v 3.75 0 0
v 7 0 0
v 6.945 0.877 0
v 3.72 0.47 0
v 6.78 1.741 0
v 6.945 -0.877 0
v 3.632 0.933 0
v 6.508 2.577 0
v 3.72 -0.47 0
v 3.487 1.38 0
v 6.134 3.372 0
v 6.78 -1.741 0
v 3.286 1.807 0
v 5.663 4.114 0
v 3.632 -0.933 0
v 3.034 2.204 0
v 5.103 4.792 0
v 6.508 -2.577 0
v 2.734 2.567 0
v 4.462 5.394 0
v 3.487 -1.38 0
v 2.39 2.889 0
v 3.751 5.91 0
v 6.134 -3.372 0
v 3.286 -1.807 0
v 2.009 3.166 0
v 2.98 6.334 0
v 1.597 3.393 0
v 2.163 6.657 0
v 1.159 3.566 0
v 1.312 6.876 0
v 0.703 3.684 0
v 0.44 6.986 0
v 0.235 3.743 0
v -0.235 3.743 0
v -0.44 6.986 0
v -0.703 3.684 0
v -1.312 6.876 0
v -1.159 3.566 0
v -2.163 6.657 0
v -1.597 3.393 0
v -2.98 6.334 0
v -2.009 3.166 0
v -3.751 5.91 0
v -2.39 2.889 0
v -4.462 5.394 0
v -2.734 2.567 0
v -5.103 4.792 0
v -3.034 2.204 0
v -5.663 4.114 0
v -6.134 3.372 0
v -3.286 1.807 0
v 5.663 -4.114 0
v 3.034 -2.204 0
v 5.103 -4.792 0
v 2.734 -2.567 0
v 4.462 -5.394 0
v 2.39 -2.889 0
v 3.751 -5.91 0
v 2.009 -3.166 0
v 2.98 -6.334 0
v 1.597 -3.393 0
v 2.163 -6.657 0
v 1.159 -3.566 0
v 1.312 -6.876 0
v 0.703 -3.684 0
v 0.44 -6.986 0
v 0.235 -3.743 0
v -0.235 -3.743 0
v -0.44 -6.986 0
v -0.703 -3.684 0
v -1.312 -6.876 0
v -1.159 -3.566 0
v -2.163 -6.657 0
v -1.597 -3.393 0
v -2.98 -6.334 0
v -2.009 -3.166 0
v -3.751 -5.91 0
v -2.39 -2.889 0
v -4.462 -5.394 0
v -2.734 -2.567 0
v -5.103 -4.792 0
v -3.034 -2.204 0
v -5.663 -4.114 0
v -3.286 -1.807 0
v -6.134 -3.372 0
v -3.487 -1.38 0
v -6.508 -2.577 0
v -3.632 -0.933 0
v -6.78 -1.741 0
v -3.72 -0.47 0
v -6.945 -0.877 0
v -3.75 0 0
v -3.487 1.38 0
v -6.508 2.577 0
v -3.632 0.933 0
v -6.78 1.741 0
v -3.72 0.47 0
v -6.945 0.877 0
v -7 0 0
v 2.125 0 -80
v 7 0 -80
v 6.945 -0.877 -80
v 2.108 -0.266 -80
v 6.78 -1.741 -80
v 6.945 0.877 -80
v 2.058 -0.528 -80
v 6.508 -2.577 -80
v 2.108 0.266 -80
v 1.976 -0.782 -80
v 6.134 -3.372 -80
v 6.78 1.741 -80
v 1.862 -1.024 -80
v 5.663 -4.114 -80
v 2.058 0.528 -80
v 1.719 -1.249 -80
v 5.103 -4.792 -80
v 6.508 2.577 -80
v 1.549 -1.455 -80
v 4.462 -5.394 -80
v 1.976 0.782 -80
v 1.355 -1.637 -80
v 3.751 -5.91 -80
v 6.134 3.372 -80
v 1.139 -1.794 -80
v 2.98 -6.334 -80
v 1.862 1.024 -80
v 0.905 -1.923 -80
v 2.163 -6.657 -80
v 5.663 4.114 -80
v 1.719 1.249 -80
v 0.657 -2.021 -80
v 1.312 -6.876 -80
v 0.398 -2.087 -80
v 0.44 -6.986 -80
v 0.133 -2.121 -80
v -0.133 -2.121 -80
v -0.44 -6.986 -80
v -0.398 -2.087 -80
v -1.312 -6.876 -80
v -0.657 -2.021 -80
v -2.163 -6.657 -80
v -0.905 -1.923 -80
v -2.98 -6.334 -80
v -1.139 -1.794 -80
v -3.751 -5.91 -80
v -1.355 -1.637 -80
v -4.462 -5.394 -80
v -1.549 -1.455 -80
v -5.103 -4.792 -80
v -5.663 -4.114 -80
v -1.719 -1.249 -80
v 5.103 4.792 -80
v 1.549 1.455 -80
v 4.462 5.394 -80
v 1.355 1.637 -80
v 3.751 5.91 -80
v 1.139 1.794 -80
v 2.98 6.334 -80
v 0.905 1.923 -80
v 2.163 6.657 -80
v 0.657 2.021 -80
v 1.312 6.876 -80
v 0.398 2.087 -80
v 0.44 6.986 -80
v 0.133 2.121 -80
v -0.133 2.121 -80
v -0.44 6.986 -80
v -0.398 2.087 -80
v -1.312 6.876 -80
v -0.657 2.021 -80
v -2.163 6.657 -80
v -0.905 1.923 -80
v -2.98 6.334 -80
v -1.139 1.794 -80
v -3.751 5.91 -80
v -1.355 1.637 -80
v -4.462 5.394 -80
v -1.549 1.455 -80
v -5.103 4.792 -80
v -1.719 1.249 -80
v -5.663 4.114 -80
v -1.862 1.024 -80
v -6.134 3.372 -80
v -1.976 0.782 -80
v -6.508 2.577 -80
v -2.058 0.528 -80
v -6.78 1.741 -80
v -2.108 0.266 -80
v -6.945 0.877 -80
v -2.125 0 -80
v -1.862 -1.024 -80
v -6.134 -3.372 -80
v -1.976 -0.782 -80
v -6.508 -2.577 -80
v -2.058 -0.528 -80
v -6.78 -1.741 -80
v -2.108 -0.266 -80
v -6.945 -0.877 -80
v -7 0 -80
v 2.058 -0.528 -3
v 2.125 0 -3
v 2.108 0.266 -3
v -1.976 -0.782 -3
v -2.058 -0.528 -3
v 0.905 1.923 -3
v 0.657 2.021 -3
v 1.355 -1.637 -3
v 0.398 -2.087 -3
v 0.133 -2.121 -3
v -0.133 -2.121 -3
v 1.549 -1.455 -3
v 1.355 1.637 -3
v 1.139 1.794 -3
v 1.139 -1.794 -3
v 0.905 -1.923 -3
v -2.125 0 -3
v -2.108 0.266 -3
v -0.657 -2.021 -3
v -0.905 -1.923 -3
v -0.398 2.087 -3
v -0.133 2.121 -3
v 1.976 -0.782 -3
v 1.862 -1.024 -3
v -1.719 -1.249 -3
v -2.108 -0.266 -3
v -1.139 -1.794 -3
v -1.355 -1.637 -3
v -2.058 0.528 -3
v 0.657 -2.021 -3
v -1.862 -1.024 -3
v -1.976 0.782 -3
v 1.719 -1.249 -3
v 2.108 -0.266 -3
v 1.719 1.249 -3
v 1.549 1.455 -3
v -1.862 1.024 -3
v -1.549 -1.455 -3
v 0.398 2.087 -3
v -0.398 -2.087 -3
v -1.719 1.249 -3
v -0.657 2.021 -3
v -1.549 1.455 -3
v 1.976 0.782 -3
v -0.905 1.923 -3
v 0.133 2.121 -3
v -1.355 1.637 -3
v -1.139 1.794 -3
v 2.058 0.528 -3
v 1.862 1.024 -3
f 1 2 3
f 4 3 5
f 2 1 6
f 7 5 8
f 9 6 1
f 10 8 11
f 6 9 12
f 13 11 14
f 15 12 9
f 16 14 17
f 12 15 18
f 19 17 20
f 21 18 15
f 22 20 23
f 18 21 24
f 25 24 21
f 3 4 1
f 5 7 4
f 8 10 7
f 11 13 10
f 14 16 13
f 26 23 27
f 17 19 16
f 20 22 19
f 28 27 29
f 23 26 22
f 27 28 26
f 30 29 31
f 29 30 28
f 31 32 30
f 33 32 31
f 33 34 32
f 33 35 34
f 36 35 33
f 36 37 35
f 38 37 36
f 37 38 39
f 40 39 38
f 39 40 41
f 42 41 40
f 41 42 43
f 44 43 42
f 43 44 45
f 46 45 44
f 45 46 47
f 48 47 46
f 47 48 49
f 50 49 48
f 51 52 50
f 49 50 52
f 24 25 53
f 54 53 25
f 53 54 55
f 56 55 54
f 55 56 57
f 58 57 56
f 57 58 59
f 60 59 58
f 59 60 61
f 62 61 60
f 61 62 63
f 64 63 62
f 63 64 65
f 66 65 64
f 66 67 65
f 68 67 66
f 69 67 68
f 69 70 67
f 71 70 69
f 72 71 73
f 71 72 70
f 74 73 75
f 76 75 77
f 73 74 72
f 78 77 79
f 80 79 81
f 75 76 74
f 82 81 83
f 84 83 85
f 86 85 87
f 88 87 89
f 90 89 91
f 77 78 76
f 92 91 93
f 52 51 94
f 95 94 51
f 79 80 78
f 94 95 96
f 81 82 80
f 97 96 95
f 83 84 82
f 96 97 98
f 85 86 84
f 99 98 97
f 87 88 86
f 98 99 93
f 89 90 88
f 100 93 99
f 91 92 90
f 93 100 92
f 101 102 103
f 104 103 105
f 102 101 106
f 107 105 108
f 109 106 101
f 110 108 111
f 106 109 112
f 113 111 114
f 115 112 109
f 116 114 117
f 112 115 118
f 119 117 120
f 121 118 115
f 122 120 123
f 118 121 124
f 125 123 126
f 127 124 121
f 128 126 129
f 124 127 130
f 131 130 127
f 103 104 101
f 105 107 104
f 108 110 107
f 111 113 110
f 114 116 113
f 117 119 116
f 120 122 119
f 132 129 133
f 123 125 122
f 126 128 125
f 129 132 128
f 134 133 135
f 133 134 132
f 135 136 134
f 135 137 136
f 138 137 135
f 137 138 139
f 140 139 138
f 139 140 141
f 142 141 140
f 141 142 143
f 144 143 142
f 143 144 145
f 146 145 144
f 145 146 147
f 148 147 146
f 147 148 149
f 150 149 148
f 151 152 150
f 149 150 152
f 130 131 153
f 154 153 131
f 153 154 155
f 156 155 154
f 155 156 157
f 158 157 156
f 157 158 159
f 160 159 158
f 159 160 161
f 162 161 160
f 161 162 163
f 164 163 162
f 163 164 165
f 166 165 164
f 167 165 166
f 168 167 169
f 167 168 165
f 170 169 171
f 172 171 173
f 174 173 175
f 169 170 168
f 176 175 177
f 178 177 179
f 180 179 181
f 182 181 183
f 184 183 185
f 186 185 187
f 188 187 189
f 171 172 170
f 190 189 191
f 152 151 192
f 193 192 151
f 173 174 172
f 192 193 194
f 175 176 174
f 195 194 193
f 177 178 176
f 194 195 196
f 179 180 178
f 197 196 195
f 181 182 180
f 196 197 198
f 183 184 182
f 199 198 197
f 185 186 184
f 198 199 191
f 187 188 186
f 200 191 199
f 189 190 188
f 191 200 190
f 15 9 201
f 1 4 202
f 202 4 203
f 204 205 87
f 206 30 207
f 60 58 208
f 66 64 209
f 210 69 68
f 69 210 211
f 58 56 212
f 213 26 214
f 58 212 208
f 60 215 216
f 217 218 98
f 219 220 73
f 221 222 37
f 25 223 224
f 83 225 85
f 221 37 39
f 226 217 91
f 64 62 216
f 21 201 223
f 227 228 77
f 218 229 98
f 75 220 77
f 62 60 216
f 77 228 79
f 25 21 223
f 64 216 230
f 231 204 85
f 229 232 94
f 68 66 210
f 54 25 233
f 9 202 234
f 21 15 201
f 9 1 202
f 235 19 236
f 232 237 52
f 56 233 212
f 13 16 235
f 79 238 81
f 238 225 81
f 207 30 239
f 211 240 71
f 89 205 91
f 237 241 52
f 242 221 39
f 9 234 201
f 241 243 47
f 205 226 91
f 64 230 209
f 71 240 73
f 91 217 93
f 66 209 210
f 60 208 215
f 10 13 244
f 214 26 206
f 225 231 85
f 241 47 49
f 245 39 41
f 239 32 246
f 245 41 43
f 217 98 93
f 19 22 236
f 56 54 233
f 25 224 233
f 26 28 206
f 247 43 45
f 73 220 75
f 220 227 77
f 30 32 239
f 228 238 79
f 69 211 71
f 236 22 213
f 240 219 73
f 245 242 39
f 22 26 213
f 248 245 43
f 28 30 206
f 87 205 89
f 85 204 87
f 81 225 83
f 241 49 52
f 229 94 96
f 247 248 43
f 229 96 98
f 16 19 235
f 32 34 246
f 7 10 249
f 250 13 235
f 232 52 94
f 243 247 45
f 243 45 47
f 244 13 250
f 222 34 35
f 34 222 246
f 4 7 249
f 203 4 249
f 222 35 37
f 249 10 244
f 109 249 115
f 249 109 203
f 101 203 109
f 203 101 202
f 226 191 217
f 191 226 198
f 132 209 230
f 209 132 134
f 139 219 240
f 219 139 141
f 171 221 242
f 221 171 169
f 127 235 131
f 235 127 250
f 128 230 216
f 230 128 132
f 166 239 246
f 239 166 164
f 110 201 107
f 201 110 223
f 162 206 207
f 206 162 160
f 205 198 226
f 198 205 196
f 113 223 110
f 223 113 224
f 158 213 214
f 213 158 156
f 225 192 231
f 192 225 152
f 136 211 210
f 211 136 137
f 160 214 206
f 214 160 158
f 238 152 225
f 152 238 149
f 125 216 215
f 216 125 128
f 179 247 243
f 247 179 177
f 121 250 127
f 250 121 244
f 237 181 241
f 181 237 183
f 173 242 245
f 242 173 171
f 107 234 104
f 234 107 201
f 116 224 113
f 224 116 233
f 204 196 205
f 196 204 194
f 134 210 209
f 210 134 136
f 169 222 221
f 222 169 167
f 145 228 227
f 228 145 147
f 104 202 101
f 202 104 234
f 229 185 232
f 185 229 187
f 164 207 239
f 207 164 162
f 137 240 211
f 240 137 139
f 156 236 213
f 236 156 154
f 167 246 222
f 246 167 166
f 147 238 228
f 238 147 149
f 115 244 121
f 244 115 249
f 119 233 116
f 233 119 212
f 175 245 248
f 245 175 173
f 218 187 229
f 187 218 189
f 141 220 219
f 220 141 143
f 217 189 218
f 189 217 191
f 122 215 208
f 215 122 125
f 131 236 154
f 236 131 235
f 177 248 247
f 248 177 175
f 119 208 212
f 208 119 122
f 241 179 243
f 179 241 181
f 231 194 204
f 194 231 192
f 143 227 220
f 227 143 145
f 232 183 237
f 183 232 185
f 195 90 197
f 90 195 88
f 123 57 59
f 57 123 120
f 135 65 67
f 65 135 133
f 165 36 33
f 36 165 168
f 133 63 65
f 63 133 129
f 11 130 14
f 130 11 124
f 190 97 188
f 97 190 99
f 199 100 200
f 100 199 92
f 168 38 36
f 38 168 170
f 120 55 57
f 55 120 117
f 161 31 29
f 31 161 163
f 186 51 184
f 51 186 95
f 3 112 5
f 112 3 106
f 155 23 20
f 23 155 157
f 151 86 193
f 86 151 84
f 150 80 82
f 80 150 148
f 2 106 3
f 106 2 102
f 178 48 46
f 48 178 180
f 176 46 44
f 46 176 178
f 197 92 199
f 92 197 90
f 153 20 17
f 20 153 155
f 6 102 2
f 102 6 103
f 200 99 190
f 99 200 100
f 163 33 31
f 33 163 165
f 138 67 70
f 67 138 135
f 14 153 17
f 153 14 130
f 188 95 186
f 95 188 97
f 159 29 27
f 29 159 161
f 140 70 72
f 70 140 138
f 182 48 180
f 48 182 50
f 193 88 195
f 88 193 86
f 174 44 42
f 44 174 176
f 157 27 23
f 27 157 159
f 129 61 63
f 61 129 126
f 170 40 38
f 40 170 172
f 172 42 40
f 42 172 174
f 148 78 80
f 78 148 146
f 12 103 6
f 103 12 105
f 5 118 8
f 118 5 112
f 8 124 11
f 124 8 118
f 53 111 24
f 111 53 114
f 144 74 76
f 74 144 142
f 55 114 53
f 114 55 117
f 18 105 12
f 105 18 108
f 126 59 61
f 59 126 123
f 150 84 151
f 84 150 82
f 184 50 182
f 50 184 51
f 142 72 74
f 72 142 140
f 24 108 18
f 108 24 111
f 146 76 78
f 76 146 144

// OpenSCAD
$fn = 50;


difference() {
	union() {
		translate(v = [0, 0, -80.0000000000]) {
			cylinder(h = 80, r = 7.0000000000);
		}
		cylinder(h = 0, r = 10.0000000000);
	}
	union() {
		translate(v = [0, 0, 0]) {
			rotate(a = [0, 0, 0]) {
				difference() {
					union() {
						#translate(v = [0, 0, -80.0000000000]) {
							cylinder(h = 80, r = 2.0000000000);
						}
						#translate(v = [0, 0, -3]) {
							cylinder(h = 3, r1 = 2.1250000000, r2 = 3.7500000000);
						}
						#translate(v = [0, 0, -80.0000000000]) {
							cylinder(h = 80, r = 2.1250000000);
						}
						#translate(v = [0, 0, -80.0000000000]) {
							cylinder(h = 80, r = 2.0000000000);
						}
					}
					union();
				}
			}
		}
	}
}
